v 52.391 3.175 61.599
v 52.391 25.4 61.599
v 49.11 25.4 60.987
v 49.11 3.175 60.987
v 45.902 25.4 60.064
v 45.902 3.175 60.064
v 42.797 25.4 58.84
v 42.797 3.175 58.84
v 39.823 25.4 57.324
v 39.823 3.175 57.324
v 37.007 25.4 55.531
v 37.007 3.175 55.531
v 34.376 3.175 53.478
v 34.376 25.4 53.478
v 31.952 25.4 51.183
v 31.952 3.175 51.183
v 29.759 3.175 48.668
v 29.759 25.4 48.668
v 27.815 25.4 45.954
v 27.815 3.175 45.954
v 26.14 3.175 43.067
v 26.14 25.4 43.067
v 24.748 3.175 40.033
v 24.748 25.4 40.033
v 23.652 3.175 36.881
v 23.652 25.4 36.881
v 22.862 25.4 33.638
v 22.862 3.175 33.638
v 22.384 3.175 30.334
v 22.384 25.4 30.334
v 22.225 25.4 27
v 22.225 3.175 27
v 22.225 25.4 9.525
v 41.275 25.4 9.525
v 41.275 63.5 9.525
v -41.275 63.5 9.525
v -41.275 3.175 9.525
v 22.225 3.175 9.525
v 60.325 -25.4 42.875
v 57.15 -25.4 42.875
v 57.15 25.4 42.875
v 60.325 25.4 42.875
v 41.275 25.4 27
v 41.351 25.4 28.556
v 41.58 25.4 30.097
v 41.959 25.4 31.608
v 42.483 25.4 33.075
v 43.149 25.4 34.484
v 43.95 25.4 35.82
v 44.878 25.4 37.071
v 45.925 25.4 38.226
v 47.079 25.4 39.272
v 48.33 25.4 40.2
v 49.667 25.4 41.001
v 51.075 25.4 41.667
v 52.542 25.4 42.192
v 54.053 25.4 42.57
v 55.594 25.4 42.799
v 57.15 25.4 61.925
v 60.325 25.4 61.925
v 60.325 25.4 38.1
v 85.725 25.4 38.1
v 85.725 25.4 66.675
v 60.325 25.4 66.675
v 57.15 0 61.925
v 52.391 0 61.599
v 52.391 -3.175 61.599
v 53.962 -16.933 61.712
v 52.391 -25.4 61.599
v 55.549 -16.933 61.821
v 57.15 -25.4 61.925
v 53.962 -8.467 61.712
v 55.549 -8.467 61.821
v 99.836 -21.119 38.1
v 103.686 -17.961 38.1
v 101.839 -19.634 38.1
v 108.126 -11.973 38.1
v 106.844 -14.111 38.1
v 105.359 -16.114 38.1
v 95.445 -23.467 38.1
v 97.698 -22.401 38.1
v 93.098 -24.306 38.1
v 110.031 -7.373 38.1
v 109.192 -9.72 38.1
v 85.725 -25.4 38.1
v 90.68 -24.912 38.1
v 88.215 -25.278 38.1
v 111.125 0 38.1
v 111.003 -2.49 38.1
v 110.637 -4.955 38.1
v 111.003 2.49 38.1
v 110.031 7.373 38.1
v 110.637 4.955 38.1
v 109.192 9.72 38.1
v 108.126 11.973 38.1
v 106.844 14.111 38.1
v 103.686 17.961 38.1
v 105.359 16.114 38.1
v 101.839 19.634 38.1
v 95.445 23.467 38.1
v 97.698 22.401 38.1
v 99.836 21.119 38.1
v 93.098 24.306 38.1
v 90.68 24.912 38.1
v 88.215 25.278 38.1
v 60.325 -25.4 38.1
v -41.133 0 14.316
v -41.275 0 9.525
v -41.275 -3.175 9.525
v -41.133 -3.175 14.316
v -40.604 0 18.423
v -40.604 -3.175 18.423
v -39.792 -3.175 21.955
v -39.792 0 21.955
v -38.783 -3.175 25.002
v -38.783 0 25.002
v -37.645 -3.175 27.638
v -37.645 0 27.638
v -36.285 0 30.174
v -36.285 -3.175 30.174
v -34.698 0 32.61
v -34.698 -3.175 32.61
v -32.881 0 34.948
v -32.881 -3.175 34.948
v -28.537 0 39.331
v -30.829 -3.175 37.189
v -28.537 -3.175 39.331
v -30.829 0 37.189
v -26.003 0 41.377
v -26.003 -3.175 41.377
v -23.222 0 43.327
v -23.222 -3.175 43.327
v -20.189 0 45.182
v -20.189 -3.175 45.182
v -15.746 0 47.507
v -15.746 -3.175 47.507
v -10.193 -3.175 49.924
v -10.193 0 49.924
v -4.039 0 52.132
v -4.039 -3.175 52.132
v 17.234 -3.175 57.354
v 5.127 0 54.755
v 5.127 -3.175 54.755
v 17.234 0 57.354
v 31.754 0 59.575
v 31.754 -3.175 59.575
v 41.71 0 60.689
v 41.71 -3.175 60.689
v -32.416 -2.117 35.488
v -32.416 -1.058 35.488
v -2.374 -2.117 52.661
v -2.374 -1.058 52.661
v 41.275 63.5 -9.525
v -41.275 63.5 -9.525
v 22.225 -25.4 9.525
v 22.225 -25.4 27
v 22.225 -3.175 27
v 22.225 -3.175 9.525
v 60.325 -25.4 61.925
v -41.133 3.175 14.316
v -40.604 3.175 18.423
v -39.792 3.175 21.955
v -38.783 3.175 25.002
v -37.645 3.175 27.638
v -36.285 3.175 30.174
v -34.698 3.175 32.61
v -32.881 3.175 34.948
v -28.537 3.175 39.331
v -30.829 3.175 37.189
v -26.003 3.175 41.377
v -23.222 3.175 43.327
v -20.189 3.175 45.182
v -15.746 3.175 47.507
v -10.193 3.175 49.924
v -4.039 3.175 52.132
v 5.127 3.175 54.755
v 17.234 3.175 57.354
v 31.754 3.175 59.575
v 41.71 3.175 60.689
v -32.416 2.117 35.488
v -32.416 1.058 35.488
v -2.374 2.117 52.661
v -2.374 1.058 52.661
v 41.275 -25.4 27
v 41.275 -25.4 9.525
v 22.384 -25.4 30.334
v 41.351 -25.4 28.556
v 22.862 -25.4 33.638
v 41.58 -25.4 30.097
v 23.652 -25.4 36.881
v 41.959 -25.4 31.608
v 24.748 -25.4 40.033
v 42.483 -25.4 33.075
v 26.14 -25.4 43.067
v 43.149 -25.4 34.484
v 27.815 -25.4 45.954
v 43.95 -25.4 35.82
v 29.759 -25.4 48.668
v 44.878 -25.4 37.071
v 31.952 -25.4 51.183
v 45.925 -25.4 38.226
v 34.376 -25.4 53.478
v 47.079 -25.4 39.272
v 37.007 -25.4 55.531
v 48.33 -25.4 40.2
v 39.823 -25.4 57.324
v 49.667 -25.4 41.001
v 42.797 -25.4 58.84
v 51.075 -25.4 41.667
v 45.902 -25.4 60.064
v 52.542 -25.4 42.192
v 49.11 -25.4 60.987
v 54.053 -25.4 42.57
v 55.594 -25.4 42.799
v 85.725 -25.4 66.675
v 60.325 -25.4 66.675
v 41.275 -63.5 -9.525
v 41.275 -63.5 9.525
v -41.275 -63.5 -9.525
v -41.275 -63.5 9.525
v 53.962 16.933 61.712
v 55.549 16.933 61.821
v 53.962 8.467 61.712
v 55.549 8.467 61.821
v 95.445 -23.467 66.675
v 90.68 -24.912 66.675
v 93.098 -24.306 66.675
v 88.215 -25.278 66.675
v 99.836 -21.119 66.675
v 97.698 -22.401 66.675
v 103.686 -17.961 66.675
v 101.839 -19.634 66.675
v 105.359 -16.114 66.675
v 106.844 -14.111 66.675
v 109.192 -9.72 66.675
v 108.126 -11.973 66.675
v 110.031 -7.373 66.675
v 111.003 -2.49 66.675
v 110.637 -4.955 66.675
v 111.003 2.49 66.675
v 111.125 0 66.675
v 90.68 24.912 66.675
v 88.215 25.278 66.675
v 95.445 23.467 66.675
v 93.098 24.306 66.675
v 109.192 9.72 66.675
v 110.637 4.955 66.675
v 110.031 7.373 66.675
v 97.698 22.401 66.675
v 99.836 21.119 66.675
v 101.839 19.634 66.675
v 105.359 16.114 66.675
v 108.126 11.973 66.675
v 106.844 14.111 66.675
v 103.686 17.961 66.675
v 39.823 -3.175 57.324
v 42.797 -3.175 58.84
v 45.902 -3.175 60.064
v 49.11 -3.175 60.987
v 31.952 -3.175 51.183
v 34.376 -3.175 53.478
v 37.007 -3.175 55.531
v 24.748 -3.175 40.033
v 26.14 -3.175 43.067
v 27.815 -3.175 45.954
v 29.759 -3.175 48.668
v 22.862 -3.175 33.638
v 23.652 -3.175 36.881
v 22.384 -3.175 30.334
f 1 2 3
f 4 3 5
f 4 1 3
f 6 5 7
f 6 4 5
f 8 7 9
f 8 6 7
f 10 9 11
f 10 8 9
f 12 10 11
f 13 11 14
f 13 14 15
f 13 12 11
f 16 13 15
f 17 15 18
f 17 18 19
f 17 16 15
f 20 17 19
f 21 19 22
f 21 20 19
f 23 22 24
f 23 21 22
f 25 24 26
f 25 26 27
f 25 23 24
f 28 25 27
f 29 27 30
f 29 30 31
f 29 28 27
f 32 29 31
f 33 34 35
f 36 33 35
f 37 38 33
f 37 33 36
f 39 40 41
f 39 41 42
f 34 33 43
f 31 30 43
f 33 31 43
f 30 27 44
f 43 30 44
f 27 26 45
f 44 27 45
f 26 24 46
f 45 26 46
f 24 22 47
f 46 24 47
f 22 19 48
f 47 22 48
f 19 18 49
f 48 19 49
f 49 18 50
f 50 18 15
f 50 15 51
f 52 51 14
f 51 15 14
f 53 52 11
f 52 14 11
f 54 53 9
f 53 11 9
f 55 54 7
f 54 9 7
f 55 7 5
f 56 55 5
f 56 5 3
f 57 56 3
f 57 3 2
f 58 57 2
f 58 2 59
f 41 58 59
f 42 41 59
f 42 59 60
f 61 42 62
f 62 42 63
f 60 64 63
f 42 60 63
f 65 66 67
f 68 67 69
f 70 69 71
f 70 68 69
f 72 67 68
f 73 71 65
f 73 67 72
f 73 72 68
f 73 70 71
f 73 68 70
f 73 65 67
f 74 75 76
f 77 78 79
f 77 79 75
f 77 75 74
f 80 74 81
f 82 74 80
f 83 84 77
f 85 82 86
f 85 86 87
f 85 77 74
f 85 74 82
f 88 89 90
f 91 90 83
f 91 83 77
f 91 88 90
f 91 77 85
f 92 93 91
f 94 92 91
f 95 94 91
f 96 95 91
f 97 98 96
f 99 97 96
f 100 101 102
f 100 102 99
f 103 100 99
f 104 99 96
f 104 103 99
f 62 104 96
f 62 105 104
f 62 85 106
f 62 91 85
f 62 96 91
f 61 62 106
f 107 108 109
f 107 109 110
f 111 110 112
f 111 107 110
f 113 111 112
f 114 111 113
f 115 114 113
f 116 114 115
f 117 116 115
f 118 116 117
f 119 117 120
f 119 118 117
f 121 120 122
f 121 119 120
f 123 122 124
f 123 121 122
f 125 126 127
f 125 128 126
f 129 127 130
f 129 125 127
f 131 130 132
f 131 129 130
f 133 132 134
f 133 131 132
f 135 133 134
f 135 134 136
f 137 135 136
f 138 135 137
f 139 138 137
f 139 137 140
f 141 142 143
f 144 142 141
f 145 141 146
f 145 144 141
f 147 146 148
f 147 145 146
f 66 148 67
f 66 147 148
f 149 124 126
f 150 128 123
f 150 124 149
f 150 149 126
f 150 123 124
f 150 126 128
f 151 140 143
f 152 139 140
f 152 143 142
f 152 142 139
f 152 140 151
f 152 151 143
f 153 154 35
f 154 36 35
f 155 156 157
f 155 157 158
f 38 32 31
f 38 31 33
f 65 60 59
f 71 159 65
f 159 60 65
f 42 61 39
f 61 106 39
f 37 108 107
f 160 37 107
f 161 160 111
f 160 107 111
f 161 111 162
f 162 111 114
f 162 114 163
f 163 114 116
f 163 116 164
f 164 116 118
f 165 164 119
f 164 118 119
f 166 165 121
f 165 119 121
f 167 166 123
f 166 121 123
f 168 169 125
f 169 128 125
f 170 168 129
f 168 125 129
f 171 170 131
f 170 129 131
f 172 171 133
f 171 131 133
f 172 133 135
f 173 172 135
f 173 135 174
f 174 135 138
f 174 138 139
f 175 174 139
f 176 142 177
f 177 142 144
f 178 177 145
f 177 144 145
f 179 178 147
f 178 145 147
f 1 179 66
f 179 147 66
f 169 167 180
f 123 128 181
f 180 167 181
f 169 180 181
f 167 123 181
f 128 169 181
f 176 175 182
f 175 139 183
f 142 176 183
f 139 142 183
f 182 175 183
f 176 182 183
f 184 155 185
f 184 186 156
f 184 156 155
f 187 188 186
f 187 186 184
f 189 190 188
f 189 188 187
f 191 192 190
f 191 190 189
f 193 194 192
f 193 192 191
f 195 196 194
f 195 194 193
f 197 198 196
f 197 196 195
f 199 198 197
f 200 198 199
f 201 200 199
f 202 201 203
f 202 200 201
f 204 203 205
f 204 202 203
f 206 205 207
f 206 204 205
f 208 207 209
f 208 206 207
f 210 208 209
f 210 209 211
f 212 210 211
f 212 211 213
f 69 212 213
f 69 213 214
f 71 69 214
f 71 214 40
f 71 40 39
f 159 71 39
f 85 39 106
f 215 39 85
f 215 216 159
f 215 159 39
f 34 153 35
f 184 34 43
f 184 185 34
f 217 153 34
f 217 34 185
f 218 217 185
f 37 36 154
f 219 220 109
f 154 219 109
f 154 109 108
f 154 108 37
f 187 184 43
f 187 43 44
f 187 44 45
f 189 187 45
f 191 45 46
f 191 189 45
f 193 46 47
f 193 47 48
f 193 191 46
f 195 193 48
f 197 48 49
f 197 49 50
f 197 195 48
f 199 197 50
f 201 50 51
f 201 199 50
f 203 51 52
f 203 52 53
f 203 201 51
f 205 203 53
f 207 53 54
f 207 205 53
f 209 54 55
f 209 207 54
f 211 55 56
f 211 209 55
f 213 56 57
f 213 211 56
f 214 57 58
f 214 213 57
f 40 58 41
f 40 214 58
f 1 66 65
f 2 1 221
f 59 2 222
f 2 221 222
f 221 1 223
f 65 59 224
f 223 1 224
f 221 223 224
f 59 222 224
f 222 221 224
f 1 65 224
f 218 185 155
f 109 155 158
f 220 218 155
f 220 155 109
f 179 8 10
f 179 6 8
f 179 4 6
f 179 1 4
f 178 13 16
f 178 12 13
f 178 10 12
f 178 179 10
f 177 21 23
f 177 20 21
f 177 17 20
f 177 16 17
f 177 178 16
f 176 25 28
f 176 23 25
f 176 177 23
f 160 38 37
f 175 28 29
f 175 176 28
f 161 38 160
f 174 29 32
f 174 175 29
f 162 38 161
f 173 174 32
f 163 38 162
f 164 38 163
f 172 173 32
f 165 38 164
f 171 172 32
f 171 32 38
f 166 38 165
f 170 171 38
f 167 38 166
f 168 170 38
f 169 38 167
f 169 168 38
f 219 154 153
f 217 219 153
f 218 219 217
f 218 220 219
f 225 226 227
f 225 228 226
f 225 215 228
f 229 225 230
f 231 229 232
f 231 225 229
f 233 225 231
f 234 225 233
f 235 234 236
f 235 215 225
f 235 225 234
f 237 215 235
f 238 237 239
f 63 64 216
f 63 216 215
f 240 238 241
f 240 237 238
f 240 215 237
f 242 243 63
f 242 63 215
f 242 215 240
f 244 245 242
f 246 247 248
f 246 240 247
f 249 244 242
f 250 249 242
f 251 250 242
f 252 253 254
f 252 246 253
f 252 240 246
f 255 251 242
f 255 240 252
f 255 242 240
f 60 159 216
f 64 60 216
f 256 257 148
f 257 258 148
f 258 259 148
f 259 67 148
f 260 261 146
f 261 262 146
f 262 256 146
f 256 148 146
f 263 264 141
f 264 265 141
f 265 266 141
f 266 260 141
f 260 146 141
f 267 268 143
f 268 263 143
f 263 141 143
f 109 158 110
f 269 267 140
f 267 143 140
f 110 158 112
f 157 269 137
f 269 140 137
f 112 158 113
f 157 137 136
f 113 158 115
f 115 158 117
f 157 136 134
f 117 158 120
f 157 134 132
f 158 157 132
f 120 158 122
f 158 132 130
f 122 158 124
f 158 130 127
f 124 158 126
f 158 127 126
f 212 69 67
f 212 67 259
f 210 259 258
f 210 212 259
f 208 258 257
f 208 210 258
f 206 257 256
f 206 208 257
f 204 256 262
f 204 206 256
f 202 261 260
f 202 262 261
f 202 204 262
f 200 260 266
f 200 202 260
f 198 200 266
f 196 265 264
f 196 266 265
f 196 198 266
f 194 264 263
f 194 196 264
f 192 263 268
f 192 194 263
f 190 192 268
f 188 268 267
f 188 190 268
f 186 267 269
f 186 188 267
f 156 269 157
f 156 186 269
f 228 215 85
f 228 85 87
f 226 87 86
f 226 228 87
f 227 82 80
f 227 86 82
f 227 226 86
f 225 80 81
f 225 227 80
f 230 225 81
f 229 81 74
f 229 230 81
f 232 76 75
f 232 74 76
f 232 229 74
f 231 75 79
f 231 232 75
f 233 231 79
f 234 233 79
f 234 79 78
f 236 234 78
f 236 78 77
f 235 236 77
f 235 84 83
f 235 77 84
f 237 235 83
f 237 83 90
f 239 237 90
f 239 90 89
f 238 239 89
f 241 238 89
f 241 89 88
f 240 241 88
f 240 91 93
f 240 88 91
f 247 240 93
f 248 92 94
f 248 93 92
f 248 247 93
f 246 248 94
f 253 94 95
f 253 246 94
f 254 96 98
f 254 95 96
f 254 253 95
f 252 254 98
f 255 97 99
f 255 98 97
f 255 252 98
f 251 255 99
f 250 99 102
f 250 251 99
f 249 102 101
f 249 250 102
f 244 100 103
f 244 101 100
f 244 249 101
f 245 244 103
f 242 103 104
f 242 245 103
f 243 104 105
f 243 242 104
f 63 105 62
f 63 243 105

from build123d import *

# Parameters (mm, degrees)
F1_DEPTH = 63.5
F0_W     = 25.4
F0_H     = 19.05
F0_H_2   = 4.7498
F0_H_3   = 4.7752
F2_DEPTH = 25.4
F3_DEPTH = 3.175


with BuildPart() as f1:
    # F0 (on Front) → F1 (new body, symmetric)
    with BuildSketch(Plane.XZ):
        Polygon((-41.275, -9.525), (41.275, -9.525), (41.275, 9.525), (22.225, 9.525), (-41.275, 9.525), align=None)
    extrude(amount=F1_DEPTH, both=True)

    # F0 (on Front) → F2 (join, symmetric)
    with BuildSketch(Plane.XZ):
        with BuildLine():
            Line((22.225, 9.525), (41.275, 9.525))
            Line((41.275, 9.525), (41.275, 27.0002))
            ThreePointArc((41.275, 27.0002), (45.9246798487, 38.2255201513), (57.15, 42.8752))
            Line((57.15, 42.8752), (60.325, 42.8752))
            Line((60.325, 42.8752), (60.325, 61.9252))
            Line((60.325, 61.9252), (57.15, 61.9252))
            add(Edge.make_bspline(
                [(52.3907166691, 61.5994029847), (53.9548508267, 61.7140325614), (55.5412148436, 61.8226215769), (57.15, 61.9252)],
                knots=[109.0083952872, 109.0083952872, 109.0083952872, 109.0083952872, 111.5045361635, 111.5045361635, 111.5045361635, 111.5045361635], degree=3))
            ThreePointArc((52.3907166691, 61.5994029847), (30.8253575966, 49.9516449945), (22.225, 27.0002))
            Line((22.225, 27.0002), (22.225, 9.525))
        make_face()
        with Locations((73.025, 52.4002)):
            Rectangle(F0_W, F0_H)
        with Locations((73.025, 64.3001)):
            Rectangle(F0_W, F0_H_2)
        with Locations((73.025, 40.4876)):
            Rectangle(F0_W, F0_H_3)
    extrude(amount=F2_DEPTH, both=True)

    # F0 (on Front) → F3 (join, symmetric)
    with BuildSketch(Plane.XZ):
        with BuildLine():
            add(Edge.make_bspline(
                [(-41.275, 9.525), (-41.8278017588, 40.0673060795), (-15.9162271246, 56.5934410498), (52.3907166691, 61.5994029847)],
                knots=[0, 0, 0, 0, 109.0083952872, 109.0083952872, 109.0083952872, 109.0083952872], degree=3))
            Line((-41.275, 9.525), (22.225, 9.525))
            Line((22.225, 9.525), (22.225, 27.0002))
            ThreePointArc((22.225, 27.0002), (30.8253575966, 49.9516449945), (52.3907166691, 61.5994029847))
        make_face()
    extrude(amount=F3_DEPTH, both=True)

    # F0 (on Front) → F4 (revolve)
    with BuildSketch(Plane.XZ):
        Polygon((85.725, 61.9252), (85.725, 42.8752), (85.725, 38.1), (111.125, 38.1), (111.125, 66.675), (85.725, 66.675), align=None)
    revolve(axis=Axis((85.725, 0, 52.3875), (0, 0, 1)))


solid = f1.part
